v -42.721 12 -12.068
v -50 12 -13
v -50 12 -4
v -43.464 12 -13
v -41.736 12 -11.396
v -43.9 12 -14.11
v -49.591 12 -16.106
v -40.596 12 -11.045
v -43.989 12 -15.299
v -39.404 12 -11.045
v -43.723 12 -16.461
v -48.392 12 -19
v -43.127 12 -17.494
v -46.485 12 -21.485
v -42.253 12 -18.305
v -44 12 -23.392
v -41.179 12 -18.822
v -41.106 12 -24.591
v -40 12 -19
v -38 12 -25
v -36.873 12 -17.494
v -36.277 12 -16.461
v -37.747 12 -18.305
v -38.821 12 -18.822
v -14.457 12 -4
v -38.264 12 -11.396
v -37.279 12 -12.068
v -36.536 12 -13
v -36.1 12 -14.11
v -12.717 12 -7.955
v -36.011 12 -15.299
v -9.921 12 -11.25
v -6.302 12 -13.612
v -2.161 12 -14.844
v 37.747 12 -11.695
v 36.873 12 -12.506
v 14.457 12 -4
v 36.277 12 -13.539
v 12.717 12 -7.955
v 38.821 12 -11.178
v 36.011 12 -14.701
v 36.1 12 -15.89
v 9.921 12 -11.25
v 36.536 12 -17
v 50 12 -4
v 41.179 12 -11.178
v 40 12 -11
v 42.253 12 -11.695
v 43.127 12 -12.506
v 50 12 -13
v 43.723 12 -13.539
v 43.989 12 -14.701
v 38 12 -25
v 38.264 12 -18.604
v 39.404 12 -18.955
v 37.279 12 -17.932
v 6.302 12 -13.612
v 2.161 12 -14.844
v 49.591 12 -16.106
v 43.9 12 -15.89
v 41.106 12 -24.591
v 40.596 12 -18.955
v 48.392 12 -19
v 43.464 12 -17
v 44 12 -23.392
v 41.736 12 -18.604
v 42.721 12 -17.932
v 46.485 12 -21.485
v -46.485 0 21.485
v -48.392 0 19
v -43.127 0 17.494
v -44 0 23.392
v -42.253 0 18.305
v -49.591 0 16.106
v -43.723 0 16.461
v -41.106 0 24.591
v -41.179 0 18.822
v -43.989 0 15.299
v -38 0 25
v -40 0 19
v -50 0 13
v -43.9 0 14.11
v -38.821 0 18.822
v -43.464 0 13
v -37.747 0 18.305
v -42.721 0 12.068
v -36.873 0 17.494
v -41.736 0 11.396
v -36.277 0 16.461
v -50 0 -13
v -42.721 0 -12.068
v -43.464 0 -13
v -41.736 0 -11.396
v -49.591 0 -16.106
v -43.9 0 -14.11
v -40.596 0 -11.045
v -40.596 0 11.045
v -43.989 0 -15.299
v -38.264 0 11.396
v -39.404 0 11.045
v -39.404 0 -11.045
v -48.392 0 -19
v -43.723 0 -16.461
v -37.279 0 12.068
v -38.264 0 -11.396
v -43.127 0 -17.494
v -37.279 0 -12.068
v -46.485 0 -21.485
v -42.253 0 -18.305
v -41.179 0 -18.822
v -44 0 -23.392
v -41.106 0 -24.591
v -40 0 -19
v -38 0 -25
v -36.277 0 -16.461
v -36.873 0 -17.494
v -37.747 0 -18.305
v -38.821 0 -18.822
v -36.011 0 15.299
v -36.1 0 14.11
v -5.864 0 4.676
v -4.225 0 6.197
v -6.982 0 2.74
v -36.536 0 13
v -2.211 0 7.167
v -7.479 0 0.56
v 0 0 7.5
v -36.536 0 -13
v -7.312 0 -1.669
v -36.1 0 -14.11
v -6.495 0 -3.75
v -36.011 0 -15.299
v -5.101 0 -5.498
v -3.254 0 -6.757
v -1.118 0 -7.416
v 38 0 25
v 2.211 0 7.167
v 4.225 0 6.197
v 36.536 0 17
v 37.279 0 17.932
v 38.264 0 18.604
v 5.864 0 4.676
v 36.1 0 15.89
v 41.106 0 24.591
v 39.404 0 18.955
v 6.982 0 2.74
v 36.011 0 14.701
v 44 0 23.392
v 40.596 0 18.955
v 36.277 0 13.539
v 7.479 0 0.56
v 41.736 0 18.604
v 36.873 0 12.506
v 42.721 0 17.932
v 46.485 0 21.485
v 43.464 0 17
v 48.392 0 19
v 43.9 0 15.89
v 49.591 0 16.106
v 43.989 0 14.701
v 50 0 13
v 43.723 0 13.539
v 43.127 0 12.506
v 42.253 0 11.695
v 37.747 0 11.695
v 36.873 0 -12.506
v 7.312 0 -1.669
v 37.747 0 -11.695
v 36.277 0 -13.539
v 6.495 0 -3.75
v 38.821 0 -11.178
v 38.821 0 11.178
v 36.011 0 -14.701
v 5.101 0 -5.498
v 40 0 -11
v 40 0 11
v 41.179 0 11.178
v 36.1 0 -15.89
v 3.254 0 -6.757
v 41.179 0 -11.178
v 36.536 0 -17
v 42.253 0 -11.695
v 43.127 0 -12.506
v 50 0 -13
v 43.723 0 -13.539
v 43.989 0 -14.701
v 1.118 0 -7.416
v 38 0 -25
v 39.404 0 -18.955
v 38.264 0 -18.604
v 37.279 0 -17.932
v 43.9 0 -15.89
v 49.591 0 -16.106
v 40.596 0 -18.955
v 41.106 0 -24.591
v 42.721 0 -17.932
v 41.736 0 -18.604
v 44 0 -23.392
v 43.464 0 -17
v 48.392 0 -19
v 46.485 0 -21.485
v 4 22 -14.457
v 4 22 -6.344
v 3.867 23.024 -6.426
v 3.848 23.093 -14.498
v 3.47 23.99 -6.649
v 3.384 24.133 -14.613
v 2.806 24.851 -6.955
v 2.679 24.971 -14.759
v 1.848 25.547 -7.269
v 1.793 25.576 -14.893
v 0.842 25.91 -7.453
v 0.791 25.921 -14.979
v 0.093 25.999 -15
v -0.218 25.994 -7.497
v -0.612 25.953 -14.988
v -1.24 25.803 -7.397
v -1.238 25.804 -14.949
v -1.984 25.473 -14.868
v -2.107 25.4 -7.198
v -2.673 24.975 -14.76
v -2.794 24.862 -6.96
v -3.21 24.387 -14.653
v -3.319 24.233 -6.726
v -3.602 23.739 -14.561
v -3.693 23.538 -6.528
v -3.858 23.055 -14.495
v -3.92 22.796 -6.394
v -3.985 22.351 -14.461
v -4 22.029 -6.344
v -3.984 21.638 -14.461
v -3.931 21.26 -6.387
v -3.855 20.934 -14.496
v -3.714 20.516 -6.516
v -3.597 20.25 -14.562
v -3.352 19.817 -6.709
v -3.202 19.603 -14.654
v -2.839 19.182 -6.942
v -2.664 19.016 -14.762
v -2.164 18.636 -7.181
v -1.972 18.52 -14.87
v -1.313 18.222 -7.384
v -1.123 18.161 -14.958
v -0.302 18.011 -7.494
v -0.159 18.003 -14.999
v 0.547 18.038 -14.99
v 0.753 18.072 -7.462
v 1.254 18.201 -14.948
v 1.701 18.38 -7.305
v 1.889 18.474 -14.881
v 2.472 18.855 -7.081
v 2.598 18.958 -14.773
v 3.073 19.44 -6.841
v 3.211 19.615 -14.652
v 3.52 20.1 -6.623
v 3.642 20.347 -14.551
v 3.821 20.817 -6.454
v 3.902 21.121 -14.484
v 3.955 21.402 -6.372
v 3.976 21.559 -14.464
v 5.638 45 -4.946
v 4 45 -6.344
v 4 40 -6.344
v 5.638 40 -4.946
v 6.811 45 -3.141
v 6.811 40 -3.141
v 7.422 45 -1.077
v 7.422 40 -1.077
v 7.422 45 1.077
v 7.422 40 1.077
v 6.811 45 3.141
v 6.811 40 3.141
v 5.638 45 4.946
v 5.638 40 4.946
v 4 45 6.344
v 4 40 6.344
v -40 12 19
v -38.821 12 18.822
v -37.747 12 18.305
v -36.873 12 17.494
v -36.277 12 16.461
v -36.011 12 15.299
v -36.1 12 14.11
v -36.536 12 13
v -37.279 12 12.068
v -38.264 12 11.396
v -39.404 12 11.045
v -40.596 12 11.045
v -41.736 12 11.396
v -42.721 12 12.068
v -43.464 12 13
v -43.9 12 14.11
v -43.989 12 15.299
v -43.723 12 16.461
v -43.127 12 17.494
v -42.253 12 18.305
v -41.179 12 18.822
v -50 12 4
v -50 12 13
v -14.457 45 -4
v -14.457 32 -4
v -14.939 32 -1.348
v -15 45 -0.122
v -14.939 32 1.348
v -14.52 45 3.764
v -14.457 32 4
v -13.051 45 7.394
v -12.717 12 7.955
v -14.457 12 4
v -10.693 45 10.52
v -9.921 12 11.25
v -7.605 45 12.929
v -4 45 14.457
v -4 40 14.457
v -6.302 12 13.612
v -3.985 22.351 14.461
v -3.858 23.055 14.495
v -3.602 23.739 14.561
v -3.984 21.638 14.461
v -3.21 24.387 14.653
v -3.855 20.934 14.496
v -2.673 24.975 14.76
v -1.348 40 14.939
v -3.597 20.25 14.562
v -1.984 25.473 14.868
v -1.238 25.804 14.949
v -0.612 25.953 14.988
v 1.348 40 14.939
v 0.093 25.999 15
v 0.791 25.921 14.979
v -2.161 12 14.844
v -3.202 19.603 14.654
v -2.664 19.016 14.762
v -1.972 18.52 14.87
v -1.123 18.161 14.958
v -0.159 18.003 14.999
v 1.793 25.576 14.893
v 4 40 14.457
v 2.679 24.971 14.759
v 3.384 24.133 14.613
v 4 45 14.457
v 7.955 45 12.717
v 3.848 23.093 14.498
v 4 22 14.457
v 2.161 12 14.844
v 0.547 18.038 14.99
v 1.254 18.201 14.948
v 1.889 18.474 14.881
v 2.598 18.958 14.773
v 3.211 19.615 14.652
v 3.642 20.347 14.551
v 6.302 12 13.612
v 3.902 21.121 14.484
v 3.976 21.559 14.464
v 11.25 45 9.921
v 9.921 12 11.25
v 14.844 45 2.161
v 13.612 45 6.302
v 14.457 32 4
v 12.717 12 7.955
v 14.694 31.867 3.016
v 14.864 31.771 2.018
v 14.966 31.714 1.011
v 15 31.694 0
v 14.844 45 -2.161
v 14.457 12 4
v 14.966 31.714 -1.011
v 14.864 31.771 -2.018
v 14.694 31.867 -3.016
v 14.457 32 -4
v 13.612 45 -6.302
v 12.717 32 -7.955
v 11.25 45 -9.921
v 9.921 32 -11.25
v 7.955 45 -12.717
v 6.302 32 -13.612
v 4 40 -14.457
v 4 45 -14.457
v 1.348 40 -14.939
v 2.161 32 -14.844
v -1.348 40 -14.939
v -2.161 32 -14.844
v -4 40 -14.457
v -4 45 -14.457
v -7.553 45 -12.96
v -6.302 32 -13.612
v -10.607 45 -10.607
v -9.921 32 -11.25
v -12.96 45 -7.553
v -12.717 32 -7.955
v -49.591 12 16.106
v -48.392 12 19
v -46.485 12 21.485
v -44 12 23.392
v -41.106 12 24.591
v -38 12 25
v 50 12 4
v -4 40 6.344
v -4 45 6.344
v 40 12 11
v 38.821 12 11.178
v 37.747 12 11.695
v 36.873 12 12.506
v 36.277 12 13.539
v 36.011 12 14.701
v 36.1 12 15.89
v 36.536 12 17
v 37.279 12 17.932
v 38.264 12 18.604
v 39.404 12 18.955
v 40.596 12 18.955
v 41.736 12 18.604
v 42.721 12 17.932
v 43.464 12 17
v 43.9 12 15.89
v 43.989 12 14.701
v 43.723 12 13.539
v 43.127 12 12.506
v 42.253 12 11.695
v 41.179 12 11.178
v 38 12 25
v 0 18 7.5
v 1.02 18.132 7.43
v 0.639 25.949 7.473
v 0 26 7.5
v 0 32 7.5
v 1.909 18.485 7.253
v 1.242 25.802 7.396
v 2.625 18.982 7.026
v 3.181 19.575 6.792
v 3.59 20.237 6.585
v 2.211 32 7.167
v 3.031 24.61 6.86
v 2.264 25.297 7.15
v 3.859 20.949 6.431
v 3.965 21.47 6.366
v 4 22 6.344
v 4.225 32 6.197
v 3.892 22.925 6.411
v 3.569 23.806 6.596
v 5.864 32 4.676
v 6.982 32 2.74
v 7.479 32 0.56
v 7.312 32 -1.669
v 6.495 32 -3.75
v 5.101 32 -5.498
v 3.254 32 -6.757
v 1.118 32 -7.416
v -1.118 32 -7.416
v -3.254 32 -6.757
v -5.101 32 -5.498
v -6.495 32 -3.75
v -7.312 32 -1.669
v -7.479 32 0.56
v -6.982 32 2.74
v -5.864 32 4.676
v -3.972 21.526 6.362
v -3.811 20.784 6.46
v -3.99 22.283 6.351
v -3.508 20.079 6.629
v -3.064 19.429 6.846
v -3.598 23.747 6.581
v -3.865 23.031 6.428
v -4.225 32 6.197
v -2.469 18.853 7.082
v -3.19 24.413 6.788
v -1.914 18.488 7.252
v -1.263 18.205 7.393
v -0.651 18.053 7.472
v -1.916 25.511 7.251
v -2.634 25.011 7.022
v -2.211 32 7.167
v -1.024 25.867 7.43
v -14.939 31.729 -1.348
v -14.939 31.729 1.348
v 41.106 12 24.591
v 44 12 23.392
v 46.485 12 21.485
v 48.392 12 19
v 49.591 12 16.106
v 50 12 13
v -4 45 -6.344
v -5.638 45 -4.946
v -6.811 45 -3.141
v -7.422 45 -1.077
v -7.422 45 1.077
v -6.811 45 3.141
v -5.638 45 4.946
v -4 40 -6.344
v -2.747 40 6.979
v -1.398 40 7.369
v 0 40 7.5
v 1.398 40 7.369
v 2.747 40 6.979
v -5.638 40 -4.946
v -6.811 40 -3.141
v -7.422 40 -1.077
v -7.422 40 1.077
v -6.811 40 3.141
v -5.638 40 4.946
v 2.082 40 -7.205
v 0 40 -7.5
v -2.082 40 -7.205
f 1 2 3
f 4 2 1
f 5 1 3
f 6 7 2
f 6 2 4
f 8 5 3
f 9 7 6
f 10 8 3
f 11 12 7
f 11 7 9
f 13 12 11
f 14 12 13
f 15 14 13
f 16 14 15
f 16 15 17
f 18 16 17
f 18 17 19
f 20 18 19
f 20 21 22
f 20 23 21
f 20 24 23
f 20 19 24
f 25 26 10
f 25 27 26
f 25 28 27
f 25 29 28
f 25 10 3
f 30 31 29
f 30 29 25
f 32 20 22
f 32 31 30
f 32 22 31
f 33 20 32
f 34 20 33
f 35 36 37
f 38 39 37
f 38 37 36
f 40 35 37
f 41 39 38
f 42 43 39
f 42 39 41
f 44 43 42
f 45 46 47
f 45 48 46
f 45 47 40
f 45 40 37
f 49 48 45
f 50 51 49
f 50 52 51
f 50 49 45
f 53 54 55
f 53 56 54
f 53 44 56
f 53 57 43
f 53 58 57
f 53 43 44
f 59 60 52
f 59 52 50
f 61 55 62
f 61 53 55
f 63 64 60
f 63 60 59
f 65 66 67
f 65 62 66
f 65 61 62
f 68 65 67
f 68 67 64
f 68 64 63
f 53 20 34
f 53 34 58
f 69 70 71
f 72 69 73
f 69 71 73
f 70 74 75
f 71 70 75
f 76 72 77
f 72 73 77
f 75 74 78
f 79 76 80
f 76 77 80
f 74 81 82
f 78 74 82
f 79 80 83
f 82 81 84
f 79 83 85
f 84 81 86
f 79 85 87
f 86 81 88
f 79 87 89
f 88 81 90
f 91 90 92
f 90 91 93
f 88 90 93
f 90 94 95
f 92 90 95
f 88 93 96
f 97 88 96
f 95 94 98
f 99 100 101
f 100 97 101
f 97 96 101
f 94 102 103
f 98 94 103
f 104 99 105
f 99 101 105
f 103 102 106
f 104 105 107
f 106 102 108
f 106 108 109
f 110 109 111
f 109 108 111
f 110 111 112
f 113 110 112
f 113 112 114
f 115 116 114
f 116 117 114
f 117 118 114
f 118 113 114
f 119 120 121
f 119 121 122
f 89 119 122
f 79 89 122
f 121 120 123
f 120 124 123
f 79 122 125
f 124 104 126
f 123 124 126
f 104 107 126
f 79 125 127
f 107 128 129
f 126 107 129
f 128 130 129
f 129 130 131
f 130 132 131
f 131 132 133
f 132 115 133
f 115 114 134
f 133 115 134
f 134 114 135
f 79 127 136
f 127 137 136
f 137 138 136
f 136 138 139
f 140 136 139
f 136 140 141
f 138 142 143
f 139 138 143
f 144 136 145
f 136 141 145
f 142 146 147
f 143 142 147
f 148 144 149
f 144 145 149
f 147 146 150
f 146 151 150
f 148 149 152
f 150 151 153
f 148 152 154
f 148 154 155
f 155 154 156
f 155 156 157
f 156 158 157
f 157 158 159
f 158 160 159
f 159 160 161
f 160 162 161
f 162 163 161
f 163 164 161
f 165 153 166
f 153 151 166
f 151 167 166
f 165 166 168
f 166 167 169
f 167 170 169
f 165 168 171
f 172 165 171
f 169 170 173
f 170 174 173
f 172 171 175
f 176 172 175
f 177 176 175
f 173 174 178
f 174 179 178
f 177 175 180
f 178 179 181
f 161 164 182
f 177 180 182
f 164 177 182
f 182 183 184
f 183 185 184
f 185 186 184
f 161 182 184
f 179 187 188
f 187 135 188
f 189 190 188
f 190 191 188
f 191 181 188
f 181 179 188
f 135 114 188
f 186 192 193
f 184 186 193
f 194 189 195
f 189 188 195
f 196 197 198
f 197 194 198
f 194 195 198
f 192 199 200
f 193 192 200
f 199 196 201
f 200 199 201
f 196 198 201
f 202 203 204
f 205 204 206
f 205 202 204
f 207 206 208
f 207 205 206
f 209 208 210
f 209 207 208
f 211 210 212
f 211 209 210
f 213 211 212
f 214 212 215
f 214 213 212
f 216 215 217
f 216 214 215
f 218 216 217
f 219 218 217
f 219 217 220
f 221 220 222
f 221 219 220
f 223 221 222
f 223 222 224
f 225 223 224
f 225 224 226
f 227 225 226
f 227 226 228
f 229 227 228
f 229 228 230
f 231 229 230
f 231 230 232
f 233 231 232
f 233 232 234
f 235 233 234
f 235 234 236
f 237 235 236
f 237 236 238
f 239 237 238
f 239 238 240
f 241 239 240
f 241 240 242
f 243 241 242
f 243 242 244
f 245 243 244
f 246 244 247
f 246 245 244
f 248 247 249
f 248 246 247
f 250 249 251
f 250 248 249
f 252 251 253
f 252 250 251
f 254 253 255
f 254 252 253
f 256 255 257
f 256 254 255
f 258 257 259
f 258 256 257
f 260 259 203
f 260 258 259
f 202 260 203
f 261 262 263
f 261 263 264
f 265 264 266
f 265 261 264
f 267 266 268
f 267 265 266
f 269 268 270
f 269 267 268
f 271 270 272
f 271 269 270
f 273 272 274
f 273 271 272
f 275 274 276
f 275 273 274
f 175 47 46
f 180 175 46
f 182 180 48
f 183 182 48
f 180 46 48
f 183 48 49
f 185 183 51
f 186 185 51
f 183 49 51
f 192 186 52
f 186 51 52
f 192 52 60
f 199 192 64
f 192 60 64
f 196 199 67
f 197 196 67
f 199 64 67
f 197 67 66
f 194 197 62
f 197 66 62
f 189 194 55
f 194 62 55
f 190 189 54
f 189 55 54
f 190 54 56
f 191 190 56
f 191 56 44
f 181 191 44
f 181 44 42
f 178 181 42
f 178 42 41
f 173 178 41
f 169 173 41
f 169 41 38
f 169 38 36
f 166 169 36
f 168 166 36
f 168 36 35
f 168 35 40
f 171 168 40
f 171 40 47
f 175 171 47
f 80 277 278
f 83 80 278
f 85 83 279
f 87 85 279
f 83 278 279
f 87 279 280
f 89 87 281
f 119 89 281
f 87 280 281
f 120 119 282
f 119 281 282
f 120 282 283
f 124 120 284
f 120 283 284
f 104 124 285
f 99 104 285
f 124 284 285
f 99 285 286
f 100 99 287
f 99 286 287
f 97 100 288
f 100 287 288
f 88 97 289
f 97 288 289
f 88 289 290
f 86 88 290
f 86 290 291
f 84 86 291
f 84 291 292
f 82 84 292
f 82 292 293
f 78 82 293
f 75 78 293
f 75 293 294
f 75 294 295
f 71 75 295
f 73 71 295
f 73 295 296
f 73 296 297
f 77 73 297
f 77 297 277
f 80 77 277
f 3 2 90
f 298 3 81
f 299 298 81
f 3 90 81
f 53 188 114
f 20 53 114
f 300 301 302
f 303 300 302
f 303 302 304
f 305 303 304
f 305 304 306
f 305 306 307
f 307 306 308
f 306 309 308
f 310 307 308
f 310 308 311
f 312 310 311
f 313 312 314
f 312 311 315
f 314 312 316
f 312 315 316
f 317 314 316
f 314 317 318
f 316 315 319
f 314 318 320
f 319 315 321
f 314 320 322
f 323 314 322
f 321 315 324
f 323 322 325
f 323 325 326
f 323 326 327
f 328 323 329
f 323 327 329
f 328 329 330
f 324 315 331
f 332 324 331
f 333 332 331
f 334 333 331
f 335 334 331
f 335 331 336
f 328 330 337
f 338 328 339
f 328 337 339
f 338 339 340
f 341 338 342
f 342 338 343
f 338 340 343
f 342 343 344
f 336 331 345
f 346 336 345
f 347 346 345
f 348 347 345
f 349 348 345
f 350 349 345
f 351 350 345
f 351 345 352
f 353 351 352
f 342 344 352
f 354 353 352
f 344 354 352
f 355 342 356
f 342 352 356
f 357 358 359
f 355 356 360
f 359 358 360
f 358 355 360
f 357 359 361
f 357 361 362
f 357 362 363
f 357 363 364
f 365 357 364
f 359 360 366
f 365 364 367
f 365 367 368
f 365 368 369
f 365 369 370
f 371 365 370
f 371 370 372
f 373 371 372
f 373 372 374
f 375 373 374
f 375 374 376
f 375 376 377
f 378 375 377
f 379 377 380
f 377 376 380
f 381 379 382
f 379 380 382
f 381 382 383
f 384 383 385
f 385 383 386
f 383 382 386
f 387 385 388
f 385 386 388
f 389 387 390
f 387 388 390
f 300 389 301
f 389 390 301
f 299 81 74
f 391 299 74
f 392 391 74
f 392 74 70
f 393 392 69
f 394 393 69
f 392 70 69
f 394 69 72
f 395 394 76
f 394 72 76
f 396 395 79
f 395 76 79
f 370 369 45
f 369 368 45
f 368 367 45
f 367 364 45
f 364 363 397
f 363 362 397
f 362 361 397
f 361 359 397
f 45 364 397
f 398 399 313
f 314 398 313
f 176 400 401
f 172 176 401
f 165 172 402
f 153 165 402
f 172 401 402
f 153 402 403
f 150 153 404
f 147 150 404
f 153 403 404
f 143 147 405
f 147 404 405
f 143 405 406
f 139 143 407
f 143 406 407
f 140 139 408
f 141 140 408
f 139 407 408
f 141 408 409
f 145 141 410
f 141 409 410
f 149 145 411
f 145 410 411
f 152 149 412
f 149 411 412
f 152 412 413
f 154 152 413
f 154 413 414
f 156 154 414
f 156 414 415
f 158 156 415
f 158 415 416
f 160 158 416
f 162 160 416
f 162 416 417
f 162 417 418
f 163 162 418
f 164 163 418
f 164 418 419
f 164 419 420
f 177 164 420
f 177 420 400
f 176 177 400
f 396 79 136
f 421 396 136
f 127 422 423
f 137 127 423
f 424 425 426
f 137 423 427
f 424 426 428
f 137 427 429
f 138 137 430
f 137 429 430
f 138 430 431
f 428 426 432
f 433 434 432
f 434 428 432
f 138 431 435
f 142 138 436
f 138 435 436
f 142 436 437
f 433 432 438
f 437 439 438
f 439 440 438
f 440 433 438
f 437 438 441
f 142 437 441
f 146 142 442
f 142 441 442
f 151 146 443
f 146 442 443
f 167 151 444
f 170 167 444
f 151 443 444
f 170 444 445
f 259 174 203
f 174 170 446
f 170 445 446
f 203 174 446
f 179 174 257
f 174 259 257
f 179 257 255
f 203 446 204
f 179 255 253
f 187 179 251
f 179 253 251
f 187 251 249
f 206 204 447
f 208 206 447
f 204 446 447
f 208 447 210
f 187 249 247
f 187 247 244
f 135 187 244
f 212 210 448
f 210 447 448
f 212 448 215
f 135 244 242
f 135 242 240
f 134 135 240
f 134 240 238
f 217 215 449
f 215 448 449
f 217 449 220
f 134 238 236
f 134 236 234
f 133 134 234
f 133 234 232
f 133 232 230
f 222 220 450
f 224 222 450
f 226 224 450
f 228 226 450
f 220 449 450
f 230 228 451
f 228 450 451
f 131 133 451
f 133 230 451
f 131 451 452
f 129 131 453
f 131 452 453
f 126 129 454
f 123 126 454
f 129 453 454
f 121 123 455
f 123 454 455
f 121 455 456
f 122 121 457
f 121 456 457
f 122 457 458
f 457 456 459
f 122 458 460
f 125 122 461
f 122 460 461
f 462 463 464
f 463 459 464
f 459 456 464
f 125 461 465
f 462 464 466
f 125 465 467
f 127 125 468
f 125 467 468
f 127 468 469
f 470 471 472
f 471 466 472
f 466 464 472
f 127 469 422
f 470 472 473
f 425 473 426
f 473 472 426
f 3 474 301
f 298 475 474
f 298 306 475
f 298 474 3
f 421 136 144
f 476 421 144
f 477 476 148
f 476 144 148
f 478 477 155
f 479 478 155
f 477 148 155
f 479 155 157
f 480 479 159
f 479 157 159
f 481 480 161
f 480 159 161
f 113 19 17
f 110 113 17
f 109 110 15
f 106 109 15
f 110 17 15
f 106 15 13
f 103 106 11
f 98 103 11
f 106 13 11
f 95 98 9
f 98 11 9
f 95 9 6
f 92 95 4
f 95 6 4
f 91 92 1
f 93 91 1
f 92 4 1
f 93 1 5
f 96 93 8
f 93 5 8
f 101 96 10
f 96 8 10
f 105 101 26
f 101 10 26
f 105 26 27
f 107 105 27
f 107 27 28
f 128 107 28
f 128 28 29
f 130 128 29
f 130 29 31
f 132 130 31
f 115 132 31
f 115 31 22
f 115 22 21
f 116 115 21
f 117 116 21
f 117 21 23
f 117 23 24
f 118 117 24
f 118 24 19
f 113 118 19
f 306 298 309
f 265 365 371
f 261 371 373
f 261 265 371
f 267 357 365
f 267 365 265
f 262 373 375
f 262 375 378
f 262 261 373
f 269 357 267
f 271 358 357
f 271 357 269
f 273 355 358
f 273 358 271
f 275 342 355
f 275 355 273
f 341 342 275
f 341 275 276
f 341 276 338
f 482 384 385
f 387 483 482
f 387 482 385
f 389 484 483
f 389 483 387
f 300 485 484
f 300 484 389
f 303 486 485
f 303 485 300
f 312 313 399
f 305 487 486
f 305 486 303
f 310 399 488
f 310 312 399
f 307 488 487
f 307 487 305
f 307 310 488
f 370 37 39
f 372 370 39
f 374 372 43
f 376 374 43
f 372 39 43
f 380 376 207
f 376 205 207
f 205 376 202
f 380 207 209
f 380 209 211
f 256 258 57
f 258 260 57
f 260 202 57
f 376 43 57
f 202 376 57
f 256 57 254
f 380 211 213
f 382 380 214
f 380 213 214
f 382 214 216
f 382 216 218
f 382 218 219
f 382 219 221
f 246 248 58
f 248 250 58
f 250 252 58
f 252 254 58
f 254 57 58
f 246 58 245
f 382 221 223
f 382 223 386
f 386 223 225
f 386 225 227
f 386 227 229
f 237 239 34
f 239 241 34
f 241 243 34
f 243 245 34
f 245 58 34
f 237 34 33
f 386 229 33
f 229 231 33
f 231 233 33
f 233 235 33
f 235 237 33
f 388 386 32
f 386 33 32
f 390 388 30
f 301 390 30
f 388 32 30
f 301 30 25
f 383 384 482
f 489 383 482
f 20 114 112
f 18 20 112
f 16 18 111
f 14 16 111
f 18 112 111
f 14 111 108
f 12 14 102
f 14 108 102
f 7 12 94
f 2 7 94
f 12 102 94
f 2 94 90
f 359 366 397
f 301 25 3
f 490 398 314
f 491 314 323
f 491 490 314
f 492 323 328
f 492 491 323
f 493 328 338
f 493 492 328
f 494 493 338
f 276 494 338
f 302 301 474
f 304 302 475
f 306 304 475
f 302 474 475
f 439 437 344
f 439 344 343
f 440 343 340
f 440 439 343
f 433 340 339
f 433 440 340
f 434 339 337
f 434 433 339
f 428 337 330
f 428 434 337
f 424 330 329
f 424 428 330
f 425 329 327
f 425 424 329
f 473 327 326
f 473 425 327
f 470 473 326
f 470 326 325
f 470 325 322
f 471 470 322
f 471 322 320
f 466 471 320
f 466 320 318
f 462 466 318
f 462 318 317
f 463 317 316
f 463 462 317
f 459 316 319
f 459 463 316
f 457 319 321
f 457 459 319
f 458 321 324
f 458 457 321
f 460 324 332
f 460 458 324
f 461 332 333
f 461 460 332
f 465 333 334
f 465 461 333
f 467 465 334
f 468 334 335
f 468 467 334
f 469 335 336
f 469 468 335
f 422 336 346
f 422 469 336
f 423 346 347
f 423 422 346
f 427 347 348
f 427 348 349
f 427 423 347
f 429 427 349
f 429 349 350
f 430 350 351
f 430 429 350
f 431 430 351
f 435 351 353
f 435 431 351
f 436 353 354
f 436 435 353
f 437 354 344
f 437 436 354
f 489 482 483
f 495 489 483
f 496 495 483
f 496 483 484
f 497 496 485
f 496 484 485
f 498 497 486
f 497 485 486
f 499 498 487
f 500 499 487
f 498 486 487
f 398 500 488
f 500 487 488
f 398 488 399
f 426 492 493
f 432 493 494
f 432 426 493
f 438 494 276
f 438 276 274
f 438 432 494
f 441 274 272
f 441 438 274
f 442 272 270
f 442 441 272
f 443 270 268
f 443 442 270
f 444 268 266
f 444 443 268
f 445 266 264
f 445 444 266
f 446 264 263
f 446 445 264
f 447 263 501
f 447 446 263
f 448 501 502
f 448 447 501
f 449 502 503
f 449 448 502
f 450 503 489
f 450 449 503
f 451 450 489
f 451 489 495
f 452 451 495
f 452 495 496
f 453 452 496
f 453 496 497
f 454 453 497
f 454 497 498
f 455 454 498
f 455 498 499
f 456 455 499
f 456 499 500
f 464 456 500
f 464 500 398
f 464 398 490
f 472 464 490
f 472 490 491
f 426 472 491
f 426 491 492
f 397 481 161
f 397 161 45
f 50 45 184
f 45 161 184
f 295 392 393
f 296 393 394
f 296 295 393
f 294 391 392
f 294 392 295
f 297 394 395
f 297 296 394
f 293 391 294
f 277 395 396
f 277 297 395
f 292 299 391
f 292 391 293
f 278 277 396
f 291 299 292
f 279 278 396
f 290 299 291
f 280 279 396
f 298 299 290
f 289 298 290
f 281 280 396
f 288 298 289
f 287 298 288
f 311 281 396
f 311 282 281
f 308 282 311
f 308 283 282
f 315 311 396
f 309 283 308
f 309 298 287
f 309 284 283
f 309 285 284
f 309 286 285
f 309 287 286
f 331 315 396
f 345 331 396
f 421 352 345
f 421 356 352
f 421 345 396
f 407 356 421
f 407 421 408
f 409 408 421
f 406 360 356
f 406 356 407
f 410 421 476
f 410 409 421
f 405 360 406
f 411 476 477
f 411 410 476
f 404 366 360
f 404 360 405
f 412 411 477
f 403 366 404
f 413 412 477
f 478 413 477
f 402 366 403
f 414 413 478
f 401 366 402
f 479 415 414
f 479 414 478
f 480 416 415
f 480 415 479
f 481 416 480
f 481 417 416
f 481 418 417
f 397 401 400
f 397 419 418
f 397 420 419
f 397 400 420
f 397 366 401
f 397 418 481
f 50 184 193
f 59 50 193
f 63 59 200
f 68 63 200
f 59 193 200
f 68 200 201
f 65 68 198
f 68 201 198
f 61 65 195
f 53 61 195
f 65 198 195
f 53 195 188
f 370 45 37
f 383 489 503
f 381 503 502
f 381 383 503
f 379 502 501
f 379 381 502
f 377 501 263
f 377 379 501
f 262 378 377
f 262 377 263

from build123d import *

# Parameters (mm, degrees)
EXTRUDE_1_DEPTH          = 12
SKETCH_2_R               = 3.999999999999999
CUT_EXTRUDE_2_DEPTH      = 58.17516943569124
EXTRUDE_2_DEPTH          = 20
CUT_EXTRUDE_3_DEPTH      = 67.06814663663573
CUT_EXTRUDE_4_DEPTH      = 67.06814663663573
SKETCH_7_R               = 7.5
CUT_EXTRUDE_5_DEPTH      = 65.41273166075167
EXTRUDE_START            = -20
SKETCH_8_R               = 15
SKETCH_8_R_2             = 7.499999999999999
EXTRUDE_3_DEPTH          = 20
SKETCH_10_R              = 15
SKETCH_10_R_2            = 7.500000000000001
EXTRUDE_4_DEPTH          = 13
SKETCH_11_OUTSIDE_W      = 126.10400000000001
SKETCH_11_OUTSIDE_H      = 76.104
CUT_EXTRUDE_7_DEPTH      = 5
CUT_EXTRUDE_8_DEPTH      = 72.76350047203664
CUT_EXTRUDE_8_DEPTH_BACK = 72.76350047203664
SKETCH_12_R              = 4


with BuildPart() as part:
    # 草图1 → 凸台-拉伸1 (new body)
    with BuildSketch(Plane(origin=(0, 0, 0), x_dir=(1, 0, 0), z_dir=(0, 1, 0))):
        with BuildLine():
            Line((37.99999999999992, 25.00000000000001), (-37.999999999999915, 25))
            ThreePointArc((-37.999999999999915, 25), (-46.48528137423857, 21.485281374238575), (-50, 12.999999999999913))
            Line((-50, 12.999999999999913), (-49.99999999999999, -12.99999999999992))
            ThreePointArc((-49.99999999999999, -12.99999999999992), (-46.48528137423857, -21.48528137423858), (-37.99999999999991, -25.000000000000004))
            Line((-37.99999999999991, -25.000000000000004), (37.99999999999992, -24.999999999999993))
            ThreePointArc((37.99999999999992, -24.999999999999993), (46.48528137423858, -21.48528137423856), (50.00000000000001, -12.999999999999908))
            Line((50.00000000000001, -12.999999999999908), (50.00000000000001, 12.999999999999927))
            ThreePointArc((50.00000000000001, 12.999999999999927), (46.48528137423858, 21.485281374238582), (37.99999999999992, 25.00000000000001))
        make_face()
    extrude(amount=EXTRUDE_1_DEPTH)

    # 草图2 → 切除-拉伸2 (cut, through all)
    with BuildSketch(Plane(origin=(0, 12, 0), x_dir=(1, 0, 0), z_dir=(0, 1, 0))):
        with Locations(Location((-39.99999999999999, -15, 0), (0, 0, 270))):
            Circle(SKETCH_2_R)
        with Locations(Location((39.99999999999999, -15, 0), (0, 0, 90))):
            Circle(SKETCH_2_R)
        with Locations(Location((39.99999999999999, 15, 0), (0, 0, 270))):
            Circle(SKETCH_2_R)
        with Locations(Location((-39.99999999999999, 15, 0), (0, 0, 90))):
            Circle(SKETCH_2_R)
    extrude(amount=-CUT_EXTRUDE_2_DEPTH, mode=Mode.SUBTRACT)

    # 草图4 → 凸台-拉伸2 (add)
    with BuildSketch(Plane(origin=(0, 12, 0), x_dir=(1, 0, 0), z_dir=(0, 1, 0))):
        with BuildLine():
            Line((-50, -4), (-14.456832294800959, -4.000000000000001))
            ThreePointArc((-14.456832294800959, -4.000000000000001), (9.2e-16, -14.999999999999998), (14.456832294800959, -4))
            Line((14.456832294800959, -4), (50.00000000000001, -3.9999999999999982))
            Line((50.00000000000001, -3.9999999999999982), (50.00000000000001, 3.9999999999999982))
            Line((50.00000000000001, 3.9999999999999982), (14.456832294800959, 4))
            ThreePointArc((14.456832294800959, 4), (9.2e-16, 14.999999999999998), (-14.456832294800959, 4.000000000000001))
            Line((-14.456832294800959, 4.000000000000001), (-50, 4))
            Line((-50, 4), (-50, -4))
        make_face()
    extrude(amount=EXTRUDE_2_DEPTH)

    # 草图5 → 切除-拉伸3 (cut, through all)
    with BuildSketch(Plane.XY.offset(4.000000000000001)):
        Polygon((-14.456832294800959, 32), (-49.99999999999999, 12), (-50, 32), align=None)
    extrude(amount=-CUT_EXTRUDE_3_DEPTH, mode=Mode.SUBTRACT)

    # 草图6 → 切除-拉伸4 (cut, through all)
    with BuildSketch(Plane.XY.offset(4.000000000000001)):
        Polygon((14.456832294800959, 32), (50.00000000000001, 12), (50.00000000000001, 32), align=None)
    extrude(amount=-CUT_EXTRUDE_4_DEPTH, mode=Mode.SUBTRACT)

    # 草图7 → 切除-拉伸5 (cut, through all)
    with BuildSketch(Plane(origin=(0, 32, 0), x_dir=(1, 0, 0), z_dir=(0, 1, 0))):
        with Locations(Location((0, 0, 0), (0, 0, 270))):
            Circle(SKETCH_7_R)
    extrude(amount=-CUT_EXTRUDE_5_DEPTH, mode=Mode.SUBTRACT)

    # 草图8 → 凸台-拉伸3 (add)
    with BuildSketch(Plane(origin=(0, 32, 0), x_dir=(1, 0, 0), z_dir=(0, 1, 0)).offset(EXTRUDE_START)):
        Circle(SKETCH_8_R)
        with Locations(Location((0, 0, 0), (0, 0, 270))):
            Circle(SKETCH_8_R_2, mode=Mode.SUBTRACT)
    extrude(amount=EXTRUDE_3_DEPTH)

    # 草图10 → 凸台-拉伸4 (add)
    with BuildSketch(Plane(origin=(0, 32, 0), x_dir=(1, 0, 0), z_dir=(0, 1, 0))):
        with Locations(Location((0, 0, 0), (0, 0, 164.533990047))):
            Circle(SKETCH_10_R)
        with Locations(Location((0, 0, 0), (0, 0, 270))):
            Circle(SKETCH_10_R_2, mode=Mode.SUBTRACT)
    extrude(amount=EXTRUDE_4_DEPTH)

    # 草图11 outside → 切除-拉伸7 (cut)
    with BuildSketch(Plane(origin=(0, 45, 0), x_dir=(1, 0, 0), z_dir=(0, 1, 0))):
        Rectangle(SKETCH_11_OUTSIDE_W, SKETCH_11_OUTSIDE_H)
        with BuildLine():
            Line((4.000000000000002, -6.34428877022476), (4.000000000000003, -14.456832294800959))
            ThreePointArc((4.000000000000003, -14.456832294800959), (15, 0), (4.000000000000003, 14.456832294800959))
            Line((4.000000000000003, 14.456832294800959), (4.000000000000002, 6.34428877022476))
            ThreePointArc((4.000000000000002, 6.34428877022476), (7.500000000000001, 0), (4.000000000000002, -6.34428877022476))
        make_face(mode=Mode.SUBTRACT)
        with BuildLine():
            Line((-4.000000000000002, -6.34428877022476), (-4.000000000000003, -14.456832294800959))
            ThreePointArc((-4.000000000000003, -14.456832294800959), (-15, 1.84e-15), (-4.000000000000003, 14.456832294800959))
            Line((-4.000000000000003, 14.456832294800959), (-4.000000000000002, 6.34428877022476))
            ThreePointArc((-4.000000000000002, 6.34428877022476), (-7.500000000000001, 9.2e-16), (-4.000000000000002, -6.34428877022476))
        make_face(mode=Mode.SUBTRACT)
    extrude(amount=-CUT_EXTRUDE_7_DEPTH, mode=Mode.SUBTRACT)

    # 草图12 → 切除-拉伸8 (cut, two sides: drawn at the far end of the back side and taken through both)
    with BuildSketch(Plane.XY.offset(-CUT_EXTRUDE_8_DEPTH_BACK)):
        with Locations((0, 22)):
            Circle(SKETCH_12_R)
    extrude(amount=CUT_EXTRUDE_8_DEPTH + CUT_EXTRUDE_8_DEPTH_BACK, mode=Mode.SUBTRACT)


solid = part.part
